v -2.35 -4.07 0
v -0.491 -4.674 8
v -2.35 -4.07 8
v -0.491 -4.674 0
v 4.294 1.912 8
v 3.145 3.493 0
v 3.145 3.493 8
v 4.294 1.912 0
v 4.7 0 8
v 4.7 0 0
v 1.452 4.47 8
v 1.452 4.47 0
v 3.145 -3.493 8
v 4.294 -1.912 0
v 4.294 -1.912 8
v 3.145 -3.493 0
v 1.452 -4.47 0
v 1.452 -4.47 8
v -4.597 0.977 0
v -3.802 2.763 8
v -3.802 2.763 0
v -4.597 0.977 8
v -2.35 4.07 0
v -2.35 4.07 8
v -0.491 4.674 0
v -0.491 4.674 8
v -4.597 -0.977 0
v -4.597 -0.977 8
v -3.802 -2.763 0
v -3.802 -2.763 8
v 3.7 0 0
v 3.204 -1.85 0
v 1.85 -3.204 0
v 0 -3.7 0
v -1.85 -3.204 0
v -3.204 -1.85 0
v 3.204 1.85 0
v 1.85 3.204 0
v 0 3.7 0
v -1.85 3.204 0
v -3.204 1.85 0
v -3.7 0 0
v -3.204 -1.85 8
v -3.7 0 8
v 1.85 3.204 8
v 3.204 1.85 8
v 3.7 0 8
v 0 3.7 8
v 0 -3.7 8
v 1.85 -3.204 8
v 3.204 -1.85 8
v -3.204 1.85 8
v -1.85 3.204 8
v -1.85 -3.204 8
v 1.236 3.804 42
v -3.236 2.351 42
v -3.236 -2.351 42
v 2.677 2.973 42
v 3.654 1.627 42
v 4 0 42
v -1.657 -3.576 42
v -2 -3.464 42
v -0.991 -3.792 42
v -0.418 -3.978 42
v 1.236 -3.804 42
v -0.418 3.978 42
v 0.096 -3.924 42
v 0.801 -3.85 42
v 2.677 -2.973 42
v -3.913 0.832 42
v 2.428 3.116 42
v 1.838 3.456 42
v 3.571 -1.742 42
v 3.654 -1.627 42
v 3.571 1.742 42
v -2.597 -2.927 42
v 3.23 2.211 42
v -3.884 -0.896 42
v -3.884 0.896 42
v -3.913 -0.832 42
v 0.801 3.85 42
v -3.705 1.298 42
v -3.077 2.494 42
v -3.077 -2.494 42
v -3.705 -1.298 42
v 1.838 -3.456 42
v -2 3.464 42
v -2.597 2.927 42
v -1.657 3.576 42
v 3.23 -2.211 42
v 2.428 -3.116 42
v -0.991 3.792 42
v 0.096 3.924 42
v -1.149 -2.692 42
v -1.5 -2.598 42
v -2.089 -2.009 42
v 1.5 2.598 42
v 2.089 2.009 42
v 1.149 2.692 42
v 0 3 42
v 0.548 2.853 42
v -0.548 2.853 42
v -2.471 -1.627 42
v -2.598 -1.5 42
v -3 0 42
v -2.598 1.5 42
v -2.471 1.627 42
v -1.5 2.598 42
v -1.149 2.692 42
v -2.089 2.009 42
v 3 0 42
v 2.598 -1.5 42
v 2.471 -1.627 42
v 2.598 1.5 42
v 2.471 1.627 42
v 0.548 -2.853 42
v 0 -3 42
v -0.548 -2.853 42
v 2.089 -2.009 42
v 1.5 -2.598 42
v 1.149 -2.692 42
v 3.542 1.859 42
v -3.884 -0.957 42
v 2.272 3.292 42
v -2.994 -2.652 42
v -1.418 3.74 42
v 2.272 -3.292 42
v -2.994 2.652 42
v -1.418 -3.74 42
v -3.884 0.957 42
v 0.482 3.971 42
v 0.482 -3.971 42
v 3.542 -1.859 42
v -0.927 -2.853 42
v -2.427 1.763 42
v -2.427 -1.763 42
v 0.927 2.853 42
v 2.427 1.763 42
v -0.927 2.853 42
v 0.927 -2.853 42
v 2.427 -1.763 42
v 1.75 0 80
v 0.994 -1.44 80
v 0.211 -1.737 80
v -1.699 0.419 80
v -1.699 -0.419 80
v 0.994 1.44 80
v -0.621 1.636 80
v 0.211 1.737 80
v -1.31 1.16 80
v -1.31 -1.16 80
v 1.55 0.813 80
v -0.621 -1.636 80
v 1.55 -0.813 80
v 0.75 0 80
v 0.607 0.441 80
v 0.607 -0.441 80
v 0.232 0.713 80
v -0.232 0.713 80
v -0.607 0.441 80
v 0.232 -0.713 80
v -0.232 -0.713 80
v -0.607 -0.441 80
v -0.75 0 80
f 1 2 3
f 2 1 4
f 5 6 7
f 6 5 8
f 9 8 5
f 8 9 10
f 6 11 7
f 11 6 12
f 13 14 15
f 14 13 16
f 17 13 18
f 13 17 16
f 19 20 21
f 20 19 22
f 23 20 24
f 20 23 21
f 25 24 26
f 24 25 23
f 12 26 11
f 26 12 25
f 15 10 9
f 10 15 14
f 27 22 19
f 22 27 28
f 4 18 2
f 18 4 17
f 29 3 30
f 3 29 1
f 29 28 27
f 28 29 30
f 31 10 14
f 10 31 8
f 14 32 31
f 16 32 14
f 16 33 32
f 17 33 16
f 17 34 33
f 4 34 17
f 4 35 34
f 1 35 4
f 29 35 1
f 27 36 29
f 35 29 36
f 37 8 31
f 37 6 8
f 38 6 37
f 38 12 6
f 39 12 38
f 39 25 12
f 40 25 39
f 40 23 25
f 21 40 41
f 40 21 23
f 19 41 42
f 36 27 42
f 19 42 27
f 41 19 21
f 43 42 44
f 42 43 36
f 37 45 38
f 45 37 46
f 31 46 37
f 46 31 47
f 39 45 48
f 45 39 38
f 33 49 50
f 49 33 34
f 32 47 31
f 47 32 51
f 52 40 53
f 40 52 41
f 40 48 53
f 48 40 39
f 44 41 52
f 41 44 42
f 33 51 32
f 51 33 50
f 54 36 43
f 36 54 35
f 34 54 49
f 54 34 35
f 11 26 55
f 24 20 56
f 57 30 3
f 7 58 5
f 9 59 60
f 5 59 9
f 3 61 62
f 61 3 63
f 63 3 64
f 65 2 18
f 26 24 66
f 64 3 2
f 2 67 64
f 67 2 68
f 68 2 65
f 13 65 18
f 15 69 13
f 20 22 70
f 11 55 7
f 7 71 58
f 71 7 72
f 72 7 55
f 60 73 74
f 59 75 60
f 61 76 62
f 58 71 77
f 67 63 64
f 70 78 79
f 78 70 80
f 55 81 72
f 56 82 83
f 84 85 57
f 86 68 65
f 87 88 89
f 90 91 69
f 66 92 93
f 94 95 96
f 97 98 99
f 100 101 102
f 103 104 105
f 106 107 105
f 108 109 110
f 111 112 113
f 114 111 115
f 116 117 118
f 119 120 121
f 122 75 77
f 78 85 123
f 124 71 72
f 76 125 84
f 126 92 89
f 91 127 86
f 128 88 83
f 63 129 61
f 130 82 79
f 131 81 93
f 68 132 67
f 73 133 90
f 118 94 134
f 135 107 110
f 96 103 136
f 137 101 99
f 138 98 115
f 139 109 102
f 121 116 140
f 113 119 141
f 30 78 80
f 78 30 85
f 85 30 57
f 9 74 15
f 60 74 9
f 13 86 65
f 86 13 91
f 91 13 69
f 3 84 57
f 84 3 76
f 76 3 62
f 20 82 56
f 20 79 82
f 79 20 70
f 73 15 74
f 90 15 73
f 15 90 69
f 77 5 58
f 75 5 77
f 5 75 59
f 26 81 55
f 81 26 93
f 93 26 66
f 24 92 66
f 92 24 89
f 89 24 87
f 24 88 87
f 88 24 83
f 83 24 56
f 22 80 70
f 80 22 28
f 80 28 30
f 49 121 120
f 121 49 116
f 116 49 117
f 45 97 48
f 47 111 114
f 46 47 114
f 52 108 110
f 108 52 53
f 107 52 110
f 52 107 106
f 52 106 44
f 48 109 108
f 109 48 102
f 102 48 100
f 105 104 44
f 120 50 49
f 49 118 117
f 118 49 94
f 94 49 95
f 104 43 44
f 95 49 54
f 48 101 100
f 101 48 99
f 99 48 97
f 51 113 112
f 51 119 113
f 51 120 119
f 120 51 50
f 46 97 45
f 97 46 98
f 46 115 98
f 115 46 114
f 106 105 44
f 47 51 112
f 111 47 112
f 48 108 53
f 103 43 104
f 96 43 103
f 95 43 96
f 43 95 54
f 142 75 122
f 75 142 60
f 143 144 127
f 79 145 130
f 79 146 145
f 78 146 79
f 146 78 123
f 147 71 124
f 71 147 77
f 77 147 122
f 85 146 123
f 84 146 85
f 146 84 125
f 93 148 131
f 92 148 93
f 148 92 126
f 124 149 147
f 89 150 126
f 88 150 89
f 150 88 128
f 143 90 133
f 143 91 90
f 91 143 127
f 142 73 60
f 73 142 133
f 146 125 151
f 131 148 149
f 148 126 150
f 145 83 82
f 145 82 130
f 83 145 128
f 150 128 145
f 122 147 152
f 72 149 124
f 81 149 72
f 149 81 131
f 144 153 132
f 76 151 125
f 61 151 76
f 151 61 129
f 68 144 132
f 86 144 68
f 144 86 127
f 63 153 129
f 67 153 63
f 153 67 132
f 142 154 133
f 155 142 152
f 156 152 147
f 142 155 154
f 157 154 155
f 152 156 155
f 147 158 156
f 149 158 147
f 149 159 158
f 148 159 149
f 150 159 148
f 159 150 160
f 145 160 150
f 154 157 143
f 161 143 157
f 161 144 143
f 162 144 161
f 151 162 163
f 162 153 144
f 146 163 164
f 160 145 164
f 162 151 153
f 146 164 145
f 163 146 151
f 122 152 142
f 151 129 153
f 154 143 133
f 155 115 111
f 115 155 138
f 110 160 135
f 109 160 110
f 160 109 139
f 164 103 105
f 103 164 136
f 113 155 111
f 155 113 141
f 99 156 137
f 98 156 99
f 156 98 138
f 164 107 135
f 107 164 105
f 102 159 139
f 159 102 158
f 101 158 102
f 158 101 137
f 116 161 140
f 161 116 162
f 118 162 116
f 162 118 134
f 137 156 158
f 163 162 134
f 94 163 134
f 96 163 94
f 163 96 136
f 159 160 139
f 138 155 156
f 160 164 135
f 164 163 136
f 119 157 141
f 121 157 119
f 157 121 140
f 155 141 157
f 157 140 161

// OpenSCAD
inner_diameter_for_pip = 7.4;
section_2_diam=6;
inner_diameter_for_sec3 = 1.5;


pipette_wall=1;

top_section=8;

section_2_height=34;
section_3_height=38;


difference(){
cylinder(r=inner_diameter_for_pip/2+pipette_wall,h=top_section);
cylinder(r=inner_diameter_for_pip/2,h=top_section);    
    
    }
    translate([0,0,top_section])
    difference(){
cylinder(r1=inner_diameter_for_pip/2+pipette_wall, r2=section_2_diam/2+pipette_wall,h=section_2_height);
cylinder(r1=inner_diameter_for_pip/2, r2=section_2_diam/2,h=section_2_height);   
    
    }
    
    
        translate([0,0,top_section+section_2_height])
    difference(){
cylinder(r2=inner_diameter_for_sec3/2+pipette_wall, r1=section_2_diam/2+pipette_wall,h=section_3_height);
cylinder(r2=inner_diameter_for_sec3/2, r1=section_2_diam/2,h=section_3_height);
    
    }
